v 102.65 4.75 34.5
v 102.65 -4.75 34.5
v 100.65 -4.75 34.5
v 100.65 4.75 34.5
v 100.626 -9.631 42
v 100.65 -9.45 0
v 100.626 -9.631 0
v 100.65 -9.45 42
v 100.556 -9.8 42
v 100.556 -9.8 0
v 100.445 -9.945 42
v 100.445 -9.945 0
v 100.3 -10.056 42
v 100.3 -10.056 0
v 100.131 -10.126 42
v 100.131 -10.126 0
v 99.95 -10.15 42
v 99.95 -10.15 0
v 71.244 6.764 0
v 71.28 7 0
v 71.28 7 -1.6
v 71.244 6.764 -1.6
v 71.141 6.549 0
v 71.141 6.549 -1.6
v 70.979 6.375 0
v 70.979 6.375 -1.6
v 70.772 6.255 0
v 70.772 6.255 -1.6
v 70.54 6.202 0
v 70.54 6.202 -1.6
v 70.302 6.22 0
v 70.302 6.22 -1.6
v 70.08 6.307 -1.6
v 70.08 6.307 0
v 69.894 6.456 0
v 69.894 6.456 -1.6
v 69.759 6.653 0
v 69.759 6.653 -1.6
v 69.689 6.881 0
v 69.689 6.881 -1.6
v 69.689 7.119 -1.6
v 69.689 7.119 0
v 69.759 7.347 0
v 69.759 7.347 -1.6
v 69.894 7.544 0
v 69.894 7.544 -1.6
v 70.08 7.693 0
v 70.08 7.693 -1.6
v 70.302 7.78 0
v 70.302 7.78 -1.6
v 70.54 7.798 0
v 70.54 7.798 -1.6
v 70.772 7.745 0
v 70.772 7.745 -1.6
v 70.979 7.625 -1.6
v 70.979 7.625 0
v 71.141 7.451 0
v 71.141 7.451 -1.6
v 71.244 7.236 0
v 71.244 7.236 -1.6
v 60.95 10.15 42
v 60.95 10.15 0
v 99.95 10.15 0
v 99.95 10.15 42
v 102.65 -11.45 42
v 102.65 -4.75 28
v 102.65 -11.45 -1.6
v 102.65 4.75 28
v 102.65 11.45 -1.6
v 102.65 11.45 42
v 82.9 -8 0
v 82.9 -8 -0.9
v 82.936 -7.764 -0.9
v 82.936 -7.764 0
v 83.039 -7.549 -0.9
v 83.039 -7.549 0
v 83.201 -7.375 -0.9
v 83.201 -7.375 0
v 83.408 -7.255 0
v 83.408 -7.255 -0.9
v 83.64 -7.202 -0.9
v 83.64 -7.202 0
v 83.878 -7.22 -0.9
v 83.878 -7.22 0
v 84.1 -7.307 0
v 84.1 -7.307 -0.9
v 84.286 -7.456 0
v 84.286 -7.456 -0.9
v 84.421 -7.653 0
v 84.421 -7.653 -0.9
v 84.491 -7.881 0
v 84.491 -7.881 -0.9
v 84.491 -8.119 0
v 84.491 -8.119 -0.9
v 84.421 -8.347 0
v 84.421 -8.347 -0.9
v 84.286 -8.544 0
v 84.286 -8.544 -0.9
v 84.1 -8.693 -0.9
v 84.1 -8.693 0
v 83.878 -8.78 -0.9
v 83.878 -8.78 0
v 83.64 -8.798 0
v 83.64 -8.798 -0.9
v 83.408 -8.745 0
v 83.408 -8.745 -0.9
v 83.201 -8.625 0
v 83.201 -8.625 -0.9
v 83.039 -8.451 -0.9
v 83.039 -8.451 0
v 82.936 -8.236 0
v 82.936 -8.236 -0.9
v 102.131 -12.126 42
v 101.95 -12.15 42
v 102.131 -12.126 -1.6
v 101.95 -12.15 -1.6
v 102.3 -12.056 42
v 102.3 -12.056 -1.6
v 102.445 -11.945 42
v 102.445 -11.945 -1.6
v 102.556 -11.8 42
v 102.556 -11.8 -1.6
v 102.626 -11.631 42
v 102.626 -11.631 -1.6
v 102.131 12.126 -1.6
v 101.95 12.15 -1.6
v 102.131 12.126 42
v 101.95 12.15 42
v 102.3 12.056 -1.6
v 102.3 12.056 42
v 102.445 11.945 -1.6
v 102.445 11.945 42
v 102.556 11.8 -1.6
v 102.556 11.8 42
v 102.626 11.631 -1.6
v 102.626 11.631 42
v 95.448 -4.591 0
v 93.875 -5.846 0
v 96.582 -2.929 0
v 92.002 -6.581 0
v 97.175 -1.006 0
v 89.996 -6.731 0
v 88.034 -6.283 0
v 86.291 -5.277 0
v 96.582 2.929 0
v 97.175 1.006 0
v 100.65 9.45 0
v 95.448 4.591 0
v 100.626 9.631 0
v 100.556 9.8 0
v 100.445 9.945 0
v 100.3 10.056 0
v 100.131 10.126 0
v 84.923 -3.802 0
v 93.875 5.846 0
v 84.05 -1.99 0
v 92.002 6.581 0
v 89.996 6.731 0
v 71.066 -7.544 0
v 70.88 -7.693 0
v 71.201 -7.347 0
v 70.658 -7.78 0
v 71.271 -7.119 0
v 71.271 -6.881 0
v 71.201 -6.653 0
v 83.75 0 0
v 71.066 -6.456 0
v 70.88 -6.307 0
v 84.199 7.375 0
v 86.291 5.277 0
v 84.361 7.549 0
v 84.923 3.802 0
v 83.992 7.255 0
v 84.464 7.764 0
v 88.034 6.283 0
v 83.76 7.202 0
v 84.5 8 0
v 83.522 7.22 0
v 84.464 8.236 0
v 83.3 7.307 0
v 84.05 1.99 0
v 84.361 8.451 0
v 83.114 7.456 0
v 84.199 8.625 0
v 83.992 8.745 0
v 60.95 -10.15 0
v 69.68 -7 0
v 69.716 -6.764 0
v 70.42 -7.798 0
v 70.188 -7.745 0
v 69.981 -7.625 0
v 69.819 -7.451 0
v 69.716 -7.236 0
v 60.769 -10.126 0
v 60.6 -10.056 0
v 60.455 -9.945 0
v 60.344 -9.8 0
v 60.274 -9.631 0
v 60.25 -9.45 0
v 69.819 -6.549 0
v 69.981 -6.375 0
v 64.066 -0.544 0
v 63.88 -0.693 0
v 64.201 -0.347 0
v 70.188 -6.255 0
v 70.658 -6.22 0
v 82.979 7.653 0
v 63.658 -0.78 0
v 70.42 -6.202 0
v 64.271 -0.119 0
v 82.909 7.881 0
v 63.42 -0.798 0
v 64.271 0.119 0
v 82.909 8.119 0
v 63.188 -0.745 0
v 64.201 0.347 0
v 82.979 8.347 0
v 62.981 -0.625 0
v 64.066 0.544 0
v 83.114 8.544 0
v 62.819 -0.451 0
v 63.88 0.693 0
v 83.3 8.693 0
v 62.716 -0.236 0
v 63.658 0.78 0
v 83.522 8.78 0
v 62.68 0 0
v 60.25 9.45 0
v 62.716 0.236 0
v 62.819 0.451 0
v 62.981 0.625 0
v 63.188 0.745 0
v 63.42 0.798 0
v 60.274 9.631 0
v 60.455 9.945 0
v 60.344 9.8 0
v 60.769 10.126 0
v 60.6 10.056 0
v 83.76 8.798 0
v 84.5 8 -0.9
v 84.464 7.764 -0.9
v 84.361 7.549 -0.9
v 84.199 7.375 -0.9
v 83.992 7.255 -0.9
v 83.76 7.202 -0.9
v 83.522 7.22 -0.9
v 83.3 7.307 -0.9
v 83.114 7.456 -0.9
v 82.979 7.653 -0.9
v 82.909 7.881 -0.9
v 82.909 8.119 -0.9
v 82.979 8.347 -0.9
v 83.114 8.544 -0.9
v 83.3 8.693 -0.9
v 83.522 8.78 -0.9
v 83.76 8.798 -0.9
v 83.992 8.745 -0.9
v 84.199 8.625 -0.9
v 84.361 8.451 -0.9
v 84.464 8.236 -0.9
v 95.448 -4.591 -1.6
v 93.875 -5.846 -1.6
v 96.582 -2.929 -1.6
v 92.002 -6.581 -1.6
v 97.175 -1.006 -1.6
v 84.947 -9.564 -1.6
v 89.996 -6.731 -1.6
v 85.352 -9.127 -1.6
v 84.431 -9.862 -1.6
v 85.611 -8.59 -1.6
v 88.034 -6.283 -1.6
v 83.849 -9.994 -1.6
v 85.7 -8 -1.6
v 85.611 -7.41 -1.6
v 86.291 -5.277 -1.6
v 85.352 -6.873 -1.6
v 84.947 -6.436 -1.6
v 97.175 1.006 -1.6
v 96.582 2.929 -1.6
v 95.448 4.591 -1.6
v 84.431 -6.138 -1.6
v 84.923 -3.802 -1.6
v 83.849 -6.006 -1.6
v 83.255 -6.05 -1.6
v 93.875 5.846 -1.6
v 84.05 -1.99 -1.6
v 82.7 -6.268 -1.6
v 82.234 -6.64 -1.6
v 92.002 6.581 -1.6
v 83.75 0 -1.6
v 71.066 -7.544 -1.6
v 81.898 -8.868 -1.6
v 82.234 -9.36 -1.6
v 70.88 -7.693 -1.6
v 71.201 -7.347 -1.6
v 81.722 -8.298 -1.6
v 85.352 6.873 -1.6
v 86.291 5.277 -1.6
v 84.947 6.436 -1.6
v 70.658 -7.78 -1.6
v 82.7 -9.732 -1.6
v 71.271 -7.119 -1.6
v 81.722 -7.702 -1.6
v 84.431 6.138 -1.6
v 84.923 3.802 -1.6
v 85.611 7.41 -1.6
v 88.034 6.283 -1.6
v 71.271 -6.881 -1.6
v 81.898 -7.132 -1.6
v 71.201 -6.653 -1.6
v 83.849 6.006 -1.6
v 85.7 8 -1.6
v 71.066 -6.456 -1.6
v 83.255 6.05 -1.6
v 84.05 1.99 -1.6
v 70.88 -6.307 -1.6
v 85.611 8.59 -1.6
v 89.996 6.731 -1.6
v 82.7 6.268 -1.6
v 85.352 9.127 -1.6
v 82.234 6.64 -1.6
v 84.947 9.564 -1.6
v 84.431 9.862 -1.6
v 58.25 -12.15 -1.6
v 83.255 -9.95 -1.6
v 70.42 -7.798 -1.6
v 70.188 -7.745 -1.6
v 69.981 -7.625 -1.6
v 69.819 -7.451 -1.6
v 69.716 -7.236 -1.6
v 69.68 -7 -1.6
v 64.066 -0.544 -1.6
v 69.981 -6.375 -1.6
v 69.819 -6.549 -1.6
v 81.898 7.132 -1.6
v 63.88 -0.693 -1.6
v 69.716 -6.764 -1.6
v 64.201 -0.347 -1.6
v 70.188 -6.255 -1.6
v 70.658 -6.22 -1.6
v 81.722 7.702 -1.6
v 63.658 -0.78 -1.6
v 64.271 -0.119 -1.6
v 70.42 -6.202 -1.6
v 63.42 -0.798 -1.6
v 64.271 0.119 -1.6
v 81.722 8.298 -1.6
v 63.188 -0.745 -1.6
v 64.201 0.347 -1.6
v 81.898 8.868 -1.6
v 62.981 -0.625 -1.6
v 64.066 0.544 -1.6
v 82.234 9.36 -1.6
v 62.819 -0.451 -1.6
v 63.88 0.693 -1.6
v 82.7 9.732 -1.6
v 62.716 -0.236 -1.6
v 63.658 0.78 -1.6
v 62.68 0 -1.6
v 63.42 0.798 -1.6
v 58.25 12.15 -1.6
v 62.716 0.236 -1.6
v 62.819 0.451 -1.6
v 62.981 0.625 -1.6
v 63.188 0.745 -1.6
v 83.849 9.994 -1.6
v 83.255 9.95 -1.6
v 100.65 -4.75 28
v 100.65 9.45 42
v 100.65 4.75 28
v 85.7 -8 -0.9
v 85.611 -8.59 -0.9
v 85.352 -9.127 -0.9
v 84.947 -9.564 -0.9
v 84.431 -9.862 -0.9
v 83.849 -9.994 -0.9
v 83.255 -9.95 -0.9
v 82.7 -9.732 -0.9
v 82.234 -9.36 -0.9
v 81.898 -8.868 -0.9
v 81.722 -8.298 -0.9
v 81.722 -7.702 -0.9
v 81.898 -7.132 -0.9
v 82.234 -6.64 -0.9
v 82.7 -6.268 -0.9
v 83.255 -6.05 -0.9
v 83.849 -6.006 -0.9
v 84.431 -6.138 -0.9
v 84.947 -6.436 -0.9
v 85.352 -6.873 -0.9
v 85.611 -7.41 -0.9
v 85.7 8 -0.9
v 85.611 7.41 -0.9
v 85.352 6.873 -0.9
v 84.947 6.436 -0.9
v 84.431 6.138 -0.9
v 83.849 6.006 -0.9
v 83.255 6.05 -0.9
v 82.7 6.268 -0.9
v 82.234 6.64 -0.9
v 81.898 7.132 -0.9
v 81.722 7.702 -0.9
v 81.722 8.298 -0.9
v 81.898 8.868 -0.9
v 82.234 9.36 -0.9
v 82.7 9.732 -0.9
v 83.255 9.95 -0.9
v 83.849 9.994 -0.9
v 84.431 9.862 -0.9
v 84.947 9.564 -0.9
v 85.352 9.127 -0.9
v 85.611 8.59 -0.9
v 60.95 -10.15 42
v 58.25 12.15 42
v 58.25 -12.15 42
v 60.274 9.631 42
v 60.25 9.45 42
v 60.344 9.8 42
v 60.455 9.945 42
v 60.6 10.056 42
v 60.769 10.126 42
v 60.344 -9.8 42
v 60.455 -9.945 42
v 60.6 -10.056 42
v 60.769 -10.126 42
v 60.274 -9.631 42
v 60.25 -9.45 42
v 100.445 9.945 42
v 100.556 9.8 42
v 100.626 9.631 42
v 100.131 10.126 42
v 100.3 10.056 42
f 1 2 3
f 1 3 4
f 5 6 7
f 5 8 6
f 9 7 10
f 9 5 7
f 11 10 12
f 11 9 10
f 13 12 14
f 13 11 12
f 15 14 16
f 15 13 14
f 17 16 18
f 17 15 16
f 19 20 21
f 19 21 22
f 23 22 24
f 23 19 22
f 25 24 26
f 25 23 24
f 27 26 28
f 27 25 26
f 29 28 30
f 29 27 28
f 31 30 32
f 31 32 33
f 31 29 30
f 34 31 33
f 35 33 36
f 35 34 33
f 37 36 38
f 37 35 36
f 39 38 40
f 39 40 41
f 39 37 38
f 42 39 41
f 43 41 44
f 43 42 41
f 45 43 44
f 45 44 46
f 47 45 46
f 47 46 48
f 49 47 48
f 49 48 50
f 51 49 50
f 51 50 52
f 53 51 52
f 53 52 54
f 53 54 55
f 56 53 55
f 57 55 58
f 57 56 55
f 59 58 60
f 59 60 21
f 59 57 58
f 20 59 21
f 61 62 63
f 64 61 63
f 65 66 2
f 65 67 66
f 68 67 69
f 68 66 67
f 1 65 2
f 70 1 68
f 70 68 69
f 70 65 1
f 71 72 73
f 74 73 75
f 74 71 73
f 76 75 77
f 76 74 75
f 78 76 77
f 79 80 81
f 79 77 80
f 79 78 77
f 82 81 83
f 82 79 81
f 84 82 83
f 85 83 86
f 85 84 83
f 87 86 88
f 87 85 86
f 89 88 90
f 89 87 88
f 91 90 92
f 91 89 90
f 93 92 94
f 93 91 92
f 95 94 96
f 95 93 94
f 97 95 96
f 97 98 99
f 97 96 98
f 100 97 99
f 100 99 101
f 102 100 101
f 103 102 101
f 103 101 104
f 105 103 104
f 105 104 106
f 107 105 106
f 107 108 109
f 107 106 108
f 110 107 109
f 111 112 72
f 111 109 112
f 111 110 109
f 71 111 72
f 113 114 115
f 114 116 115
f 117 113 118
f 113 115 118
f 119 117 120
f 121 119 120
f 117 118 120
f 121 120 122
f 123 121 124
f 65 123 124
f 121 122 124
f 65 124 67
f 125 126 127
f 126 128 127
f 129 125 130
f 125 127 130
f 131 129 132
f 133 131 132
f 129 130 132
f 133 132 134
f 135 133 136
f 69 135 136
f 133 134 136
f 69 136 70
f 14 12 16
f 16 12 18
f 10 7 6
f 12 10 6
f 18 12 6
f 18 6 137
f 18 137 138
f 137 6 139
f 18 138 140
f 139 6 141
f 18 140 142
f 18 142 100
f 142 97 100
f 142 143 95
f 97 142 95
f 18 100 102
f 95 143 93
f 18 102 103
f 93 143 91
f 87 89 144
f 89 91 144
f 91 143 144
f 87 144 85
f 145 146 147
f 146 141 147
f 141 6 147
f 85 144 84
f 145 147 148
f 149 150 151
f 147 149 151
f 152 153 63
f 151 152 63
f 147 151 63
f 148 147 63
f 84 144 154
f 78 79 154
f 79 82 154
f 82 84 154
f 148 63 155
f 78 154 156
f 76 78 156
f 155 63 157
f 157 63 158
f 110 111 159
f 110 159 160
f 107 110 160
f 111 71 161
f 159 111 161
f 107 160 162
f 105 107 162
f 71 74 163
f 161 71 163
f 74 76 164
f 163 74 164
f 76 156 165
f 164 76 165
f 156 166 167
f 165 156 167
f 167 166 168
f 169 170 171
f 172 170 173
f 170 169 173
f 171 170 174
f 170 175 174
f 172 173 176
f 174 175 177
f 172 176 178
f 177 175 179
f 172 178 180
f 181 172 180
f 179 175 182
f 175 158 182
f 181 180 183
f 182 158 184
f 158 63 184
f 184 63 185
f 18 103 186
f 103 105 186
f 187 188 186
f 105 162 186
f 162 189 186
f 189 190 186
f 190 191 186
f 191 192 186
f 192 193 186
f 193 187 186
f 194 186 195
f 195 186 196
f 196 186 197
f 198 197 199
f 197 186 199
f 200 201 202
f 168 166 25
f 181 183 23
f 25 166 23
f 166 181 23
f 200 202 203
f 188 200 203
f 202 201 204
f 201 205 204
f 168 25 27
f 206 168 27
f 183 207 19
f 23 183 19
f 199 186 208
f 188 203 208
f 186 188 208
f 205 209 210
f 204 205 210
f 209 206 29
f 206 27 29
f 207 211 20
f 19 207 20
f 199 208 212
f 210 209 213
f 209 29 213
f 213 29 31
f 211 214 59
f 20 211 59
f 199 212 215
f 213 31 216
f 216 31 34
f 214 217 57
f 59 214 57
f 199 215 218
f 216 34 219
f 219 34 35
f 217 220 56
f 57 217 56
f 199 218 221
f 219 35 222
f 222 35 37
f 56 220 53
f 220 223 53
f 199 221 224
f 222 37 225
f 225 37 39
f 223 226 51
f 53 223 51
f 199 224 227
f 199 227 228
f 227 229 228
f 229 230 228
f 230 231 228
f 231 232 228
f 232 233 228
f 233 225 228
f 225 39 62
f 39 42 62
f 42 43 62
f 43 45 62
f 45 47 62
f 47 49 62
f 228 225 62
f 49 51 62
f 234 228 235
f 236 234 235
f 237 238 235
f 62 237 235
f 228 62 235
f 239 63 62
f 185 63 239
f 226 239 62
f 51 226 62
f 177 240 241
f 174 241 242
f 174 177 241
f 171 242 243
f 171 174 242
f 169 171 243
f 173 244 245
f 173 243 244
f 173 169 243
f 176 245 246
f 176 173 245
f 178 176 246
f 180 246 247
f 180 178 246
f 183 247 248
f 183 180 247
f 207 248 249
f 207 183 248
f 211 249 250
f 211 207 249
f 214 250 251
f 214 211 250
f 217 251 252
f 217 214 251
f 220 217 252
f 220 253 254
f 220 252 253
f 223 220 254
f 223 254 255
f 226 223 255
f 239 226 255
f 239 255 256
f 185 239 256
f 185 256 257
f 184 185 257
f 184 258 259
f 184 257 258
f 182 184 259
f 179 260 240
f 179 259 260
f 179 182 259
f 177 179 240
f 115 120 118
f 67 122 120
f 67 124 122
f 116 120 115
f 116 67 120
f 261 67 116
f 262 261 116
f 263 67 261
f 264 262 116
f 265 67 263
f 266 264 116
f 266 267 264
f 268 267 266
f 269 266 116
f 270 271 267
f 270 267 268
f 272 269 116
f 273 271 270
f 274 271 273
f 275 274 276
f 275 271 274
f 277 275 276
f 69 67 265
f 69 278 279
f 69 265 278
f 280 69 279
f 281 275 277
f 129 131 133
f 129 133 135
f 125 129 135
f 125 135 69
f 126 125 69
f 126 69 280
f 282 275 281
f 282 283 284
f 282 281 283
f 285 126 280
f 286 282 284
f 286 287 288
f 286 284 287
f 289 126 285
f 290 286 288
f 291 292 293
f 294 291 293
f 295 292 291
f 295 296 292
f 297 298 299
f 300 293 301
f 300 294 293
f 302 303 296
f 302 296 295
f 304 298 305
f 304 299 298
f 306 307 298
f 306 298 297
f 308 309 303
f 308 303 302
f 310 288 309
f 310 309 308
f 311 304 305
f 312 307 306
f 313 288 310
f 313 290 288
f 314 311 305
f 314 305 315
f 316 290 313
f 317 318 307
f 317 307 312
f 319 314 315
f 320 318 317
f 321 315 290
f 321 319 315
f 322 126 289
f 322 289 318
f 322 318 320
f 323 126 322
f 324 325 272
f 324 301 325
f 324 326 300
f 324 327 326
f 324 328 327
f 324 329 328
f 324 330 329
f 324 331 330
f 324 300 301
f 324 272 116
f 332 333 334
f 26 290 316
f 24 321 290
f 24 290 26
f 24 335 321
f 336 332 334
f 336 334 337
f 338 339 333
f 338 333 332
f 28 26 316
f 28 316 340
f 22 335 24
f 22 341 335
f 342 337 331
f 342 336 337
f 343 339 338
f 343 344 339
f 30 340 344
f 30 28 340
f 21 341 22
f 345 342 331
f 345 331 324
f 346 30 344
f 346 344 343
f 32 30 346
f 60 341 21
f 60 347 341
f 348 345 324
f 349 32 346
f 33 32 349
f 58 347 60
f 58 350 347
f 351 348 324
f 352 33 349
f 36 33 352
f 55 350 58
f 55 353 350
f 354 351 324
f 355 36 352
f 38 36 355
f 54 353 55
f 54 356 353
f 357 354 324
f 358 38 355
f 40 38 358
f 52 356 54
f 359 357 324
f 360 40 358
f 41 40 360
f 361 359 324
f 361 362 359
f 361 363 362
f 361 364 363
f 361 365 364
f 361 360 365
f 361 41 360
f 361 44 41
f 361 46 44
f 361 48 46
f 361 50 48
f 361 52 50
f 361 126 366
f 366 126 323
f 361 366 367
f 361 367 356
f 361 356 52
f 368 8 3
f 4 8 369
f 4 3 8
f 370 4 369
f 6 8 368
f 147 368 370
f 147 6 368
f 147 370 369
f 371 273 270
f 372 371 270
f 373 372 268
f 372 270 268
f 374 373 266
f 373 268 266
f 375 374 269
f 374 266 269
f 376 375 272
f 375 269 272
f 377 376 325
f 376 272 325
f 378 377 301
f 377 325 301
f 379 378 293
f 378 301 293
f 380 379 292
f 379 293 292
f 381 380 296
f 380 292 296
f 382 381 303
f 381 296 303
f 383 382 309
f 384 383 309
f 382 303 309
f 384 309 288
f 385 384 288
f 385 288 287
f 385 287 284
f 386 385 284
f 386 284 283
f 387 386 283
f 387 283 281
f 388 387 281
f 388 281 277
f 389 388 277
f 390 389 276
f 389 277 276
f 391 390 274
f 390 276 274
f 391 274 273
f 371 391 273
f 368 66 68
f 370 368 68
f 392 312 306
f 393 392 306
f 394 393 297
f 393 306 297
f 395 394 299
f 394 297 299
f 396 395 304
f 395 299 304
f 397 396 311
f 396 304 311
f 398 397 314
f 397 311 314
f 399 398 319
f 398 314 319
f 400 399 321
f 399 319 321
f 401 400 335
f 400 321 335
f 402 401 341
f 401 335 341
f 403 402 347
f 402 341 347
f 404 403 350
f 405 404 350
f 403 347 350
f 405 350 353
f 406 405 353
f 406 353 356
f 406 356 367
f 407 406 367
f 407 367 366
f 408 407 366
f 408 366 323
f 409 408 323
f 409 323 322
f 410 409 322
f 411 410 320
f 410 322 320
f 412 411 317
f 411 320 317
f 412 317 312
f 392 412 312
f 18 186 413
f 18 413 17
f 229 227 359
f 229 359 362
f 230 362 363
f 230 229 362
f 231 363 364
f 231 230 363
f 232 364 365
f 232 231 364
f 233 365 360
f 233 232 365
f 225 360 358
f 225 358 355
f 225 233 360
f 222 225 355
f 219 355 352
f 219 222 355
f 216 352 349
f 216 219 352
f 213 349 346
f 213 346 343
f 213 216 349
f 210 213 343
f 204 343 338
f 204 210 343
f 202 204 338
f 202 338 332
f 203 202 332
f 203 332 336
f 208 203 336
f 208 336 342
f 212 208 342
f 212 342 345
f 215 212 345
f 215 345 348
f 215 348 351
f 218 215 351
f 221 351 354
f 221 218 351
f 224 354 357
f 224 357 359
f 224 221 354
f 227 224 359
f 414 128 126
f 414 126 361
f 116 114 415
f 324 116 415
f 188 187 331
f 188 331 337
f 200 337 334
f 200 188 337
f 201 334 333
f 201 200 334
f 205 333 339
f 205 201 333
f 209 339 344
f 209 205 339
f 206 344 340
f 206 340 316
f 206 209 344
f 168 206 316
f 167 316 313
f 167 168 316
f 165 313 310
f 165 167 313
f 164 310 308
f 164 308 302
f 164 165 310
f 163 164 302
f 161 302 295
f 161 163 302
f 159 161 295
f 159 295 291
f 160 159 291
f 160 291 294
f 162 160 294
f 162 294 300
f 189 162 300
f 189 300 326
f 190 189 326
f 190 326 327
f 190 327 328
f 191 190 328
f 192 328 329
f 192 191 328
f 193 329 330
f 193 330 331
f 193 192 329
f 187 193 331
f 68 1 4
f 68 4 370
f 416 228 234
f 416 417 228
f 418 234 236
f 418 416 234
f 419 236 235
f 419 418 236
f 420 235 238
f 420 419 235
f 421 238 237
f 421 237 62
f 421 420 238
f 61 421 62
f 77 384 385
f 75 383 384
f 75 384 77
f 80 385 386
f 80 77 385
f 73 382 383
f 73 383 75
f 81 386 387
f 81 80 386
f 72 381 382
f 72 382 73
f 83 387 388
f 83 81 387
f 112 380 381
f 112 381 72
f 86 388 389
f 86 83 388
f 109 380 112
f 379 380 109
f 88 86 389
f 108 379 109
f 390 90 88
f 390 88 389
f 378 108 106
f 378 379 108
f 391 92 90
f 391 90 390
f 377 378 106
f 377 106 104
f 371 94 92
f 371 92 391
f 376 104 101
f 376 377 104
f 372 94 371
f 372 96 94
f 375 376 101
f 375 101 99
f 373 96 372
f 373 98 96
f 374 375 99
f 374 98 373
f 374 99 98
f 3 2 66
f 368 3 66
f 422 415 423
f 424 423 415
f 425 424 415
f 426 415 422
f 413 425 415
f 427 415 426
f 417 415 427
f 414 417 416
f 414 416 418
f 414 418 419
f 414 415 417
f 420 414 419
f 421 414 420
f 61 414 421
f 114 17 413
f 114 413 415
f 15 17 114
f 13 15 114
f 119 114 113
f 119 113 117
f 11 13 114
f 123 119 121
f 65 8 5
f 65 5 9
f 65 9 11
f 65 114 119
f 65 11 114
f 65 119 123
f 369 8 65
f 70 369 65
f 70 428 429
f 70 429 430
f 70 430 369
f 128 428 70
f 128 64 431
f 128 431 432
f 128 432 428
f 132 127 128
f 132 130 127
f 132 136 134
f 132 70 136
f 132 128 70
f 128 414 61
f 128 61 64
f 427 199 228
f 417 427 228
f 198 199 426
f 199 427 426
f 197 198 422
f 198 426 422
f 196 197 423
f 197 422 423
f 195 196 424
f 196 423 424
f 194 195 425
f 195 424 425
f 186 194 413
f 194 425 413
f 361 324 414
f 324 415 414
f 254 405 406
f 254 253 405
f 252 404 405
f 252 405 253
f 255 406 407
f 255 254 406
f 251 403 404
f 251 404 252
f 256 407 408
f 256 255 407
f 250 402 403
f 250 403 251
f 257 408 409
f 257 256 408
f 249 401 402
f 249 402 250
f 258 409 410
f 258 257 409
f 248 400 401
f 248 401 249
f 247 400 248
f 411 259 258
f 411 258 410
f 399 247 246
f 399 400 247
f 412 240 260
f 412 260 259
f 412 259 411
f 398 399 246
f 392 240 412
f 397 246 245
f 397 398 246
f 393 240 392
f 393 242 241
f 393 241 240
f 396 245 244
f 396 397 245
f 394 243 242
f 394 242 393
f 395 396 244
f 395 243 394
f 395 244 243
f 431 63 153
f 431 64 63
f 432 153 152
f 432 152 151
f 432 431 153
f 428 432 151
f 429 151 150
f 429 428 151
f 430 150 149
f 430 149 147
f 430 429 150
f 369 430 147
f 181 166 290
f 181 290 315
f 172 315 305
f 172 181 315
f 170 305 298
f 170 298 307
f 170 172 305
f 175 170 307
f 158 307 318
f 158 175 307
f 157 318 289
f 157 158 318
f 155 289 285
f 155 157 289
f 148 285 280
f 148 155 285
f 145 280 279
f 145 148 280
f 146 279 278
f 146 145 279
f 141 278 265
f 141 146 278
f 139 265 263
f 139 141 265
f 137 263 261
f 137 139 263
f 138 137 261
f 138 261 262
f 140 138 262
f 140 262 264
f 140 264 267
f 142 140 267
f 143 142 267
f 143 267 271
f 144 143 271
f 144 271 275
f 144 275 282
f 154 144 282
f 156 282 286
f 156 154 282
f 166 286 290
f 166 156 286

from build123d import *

# Parameters (mm, degrees)
SKETCH_1_W          = 44.4
SKETCH_1_H          = 24.3
SKETCH_1_W_2        = 40.4
SKETCH_1_H_2        = 20.3
EXTRUDE_5_DEPTH     = 42
EXTRUDE_5_2_DEPTH   = 42
EXTRUDE_6_DEPTH     = 42
EXTRUDE_6_2_DEPTH   = 42
EXTRUDE_6_3_DEPTH   = 42
EXTRUDE_6_4_DEPTH   = 42
SKETCH_6_R          = 6.75
SKETCH_6_R_2        = 0.8
SKETCH_6_W          = 44.4
SKETCH_6_H          = 24.3
EXTRUDE_8_DEPTH     = 1.6
FILLET_1_R          = 0.7
FILLET_2_R          = 0.7
FILLET_3_R          = 0.7
FILLET_4_R          = 0.7
FILLET_5_R          = 0.7
FILLET_6_R          = 0.7
SKETCH_7_R          = 2
CUT_EXTRUDE_2_DEPTH = 0.7
SKETCH_8_W          = 6.5
SKETCH_8_H          = 9.5
CUT_EXTRUDE_3_DEPTH = 9.8
SKETCH_9_W          = 6.5
SKETCH_9_H          = 9.5
CUT_EXTRUDE_4_DEPTH = 9.8
SKETCH_10_W         = 6.5
SKETCH_10_H         = 9.5
CUT_EXTRUDE_5_DEPTH = 9.8
SKETCH_11_W         = 6.5
SKETCH_11_H         = 9.5
CUT_EXTRUDE_6_DEPTH = 9.8
SKETCH_12_W         = 6.5
SKETCH_12_H         = 9.5
CUT_EXTRUDE_7_DEPTH = 9.8
SKETCH_13_W         = 6.5
SKETCH_13_H         = 9.5
CUT_EXTRUDE_8_DEPTH = 9.8
FILLET_7_R          = 0.7
FILLET_8_R          = 0.7
FILLET_9_R          = 0.7
FILLET_10_R         = 0.7
FILLET_11_R         = 0.7
FILLET_12_R         = 0.7
EXTRUDE_9_DEPTH     = 3
EXTRUDE_11_DEPTH    = 3
EXTRUDE_12_DEPTH    = 3
EXTRUDE_START       = -3
EXTRUDE_13_DEPTH    = 3
CUT_EXTRUDE_9_DEPTH = 10


with BuildPart() as part:
    # 草图1 → 凸台-拉伸5 (new body)
    with BuildSketch(Plane.XY):
        with Locations((80.45, 0)):
            Rectangle(SKETCH_1_W, SKETCH_1_H)
        with Locations((80.45, 0)):
            Rectangle(SKETCH_1_W_2, SKETCH_1_H_2, mode=Mode.SUBTRACT)
    extrude(amount=EXTRUDE_5_DEPTH)



with BuildPart() as body_2:
    # 草图1 → Extrude 5 2 (new body)
    with BuildSketch(Plane.XY):
        with Locations((-80.45, 0)):
            Rectangle(SKETCH_1_W, SKETCH_1_H)
        with Locations((-80.45, 0)):
            Rectangle(SKETCH_1_W_2, SKETCH_1_H_2, mode=Mode.SUBTRACT)
    extrude(amount=EXTRUDE_5_2_DEPTH)


with BuildPart() as body_3:
    # 草图5 → 凸台-拉伸6 (new body)
    with BuildSketch(Plane.XY):
        Polygon((28.782128445, 85.964823228), (60.17766953, 117.360364312), (77.360364312, 100.17766953), (45.964823228, 68.782128445), align=None)
        Polygon((60.17766953, 114.531937188), (74.531937188, 100.17766953), (45.964823228, 71.61055557), (31.61055557, 85.964823228), align=None, mode=Mode.SUBTRACT)
    extrude(amount=EXTRUDE_6_DEPTH)


with BuildPart() as body_4:
    # 草图5 → Extrude 6 2 (new body)
    with BuildSketch(Plane.XY):
        Polygon((45.964823228, -68.782128445), (28.782128445, -85.964823228), (60.17766953, -117.360364312), (77.360364312, -100.17766953), align=None)
        Polygon((31.61055557, -85.964823228), (60.17766953, -114.531937188), (74.531937188, -100.17766953), (45.964823228, -71.61055557), align=None, mode=Mode.SUBTRACT)
    extrude(amount=EXTRUDE_6_2_DEPTH)


with BuildPart() as body_5:
    # 草图5 → Extrude 6 3 (new body)
    with BuildSketch(Plane.XY):
        Polygon((-28.782128445, -85.964823228), (-60.17766953, -117.360364312), (-77.360364312, -100.17766953), (-45.964823228, -68.782128445), align=None)
        Polygon((-60.17766953, -114.531937188), (-74.531937188, -100.17766953), (-45.964823228, -71.61055557), (-31.61055557, -85.964823228), align=None, mode=Mode.SUBTRACT)
    extrude(amount=EXTRUDE_6_3_DEPTH)


with BuildPart() as body_6:
    # 草图5 → Extrude 6 4 (new body)
    with BuildSketch(Plane.XY):
        Polygon((-45.964823228, 68.782128445), (-28.782128445, 85.964823228), (-60.17766953, 117.360364312), (-77.360364312, 100.17766953), align=None)
        Polygon((-31.61055557, 85.964823228), (-60.17766953, 114.531937188), (-74.531937188, 100.17766953), (-45.964823228, 71.61055557), align=None, mode=Mode.SUBTRACT)
    extrude(amount=EXTRUDE_6_4_DEPTH)


with BuildPart() as part_1:
    add(part.part)

    add(body_2.part)  # 凸台-拉伸8 merges body 2

    add(body_3.part)  # 凸台-拉伸8 merges body 3

    add(body_4.part)  # 凸台-拉伸8 merges body 4

    add(body_5.part)  # 凸台-拉伸8 merges body 5

    add(body_6.part)  # 凸台-拉伸8 merges body 6
    # 草图6 → 凸台-拉伸8 (add)
    # profile 1 of 6: a face of its own
    with BuildSketch(Plane(origin=(0, 0, 0), x_dir=(-1, 0, 0), z_dir=(0, 0, -1))):
        Polygon((-77.360364312, 100.17766953), (-60.17766953, 117.360364312), (-28.782128445, 85.964823228), (-45.964823228, 68.782128445), align=None)
        with Locations((-60.17766953, 100.17766953)):
            Circle(SKETCH_6_R, mode=Mode.SUBTRACT)
        with Locations((-61.026197667, 89.712489168)):
            Circle(SKETCH_6_R_2, mode=Mode.SUBTRACT)
        with Locations((-50.971139239, 81.071644302)):
            Circle(SKETCH_6_R_2, mode=Mode.SUBTRACT)
        with Locations((-41.071644302, 81.071644302)):
            Circle(SKETCH_6_R_2, mode=Mode.SUBTRACT)
        with Locations(Location((-41.071644302, 90.971139239, 0), (0, 0, 180))):
            Circle(SKETCH_6_R_2, mode=Mode.SUBTRACT)
        with Locations(Location((-49.712489168, 101.026197667, 0), (0, 0, 180))):
            Circle(SKETCH_6_R_2, mode=Mode.SUBTRACT)
    # profile 2 of 6: a face of its own
    with BuildSketch(Plane(origin=(0, 0, 0), x_dir=(-1, 0, 0), z_dir=(0, 0, -1))):
        with Locations((-80.45, 0)):
            Rectangle(SKETCH_6_W, SKETCH_6_H)
        with Locations((-70.48, -7)):
            Circle(SKETCH_6_R_2, mode=Mode.SUBTRACT)
        with Locations((-63.48, 0)):
            Circle(SKETCH_6_R_2, mode=Mode.SUBTRACT)
        with Locations((-90.5, 0)):
            Circle(SKETCH_6_R, mode=Mode.SUBTRACT)
        with Locations((-83.7, -8)):
            Circle(SKETCH_6_R_2, mode=Mode.SUBTRACT)
        with Locations(Location((-70.48, 7, 0), (0, 0, 180))):
            Circle(SKETCH_6_R_2, mode=Mode.SUBTRACT)
        with Locations(Location((-83.7, 8, 0), (0, 0, 180))):
            Circle(SKETCH_6_R_2, mode=Mode.SUBTRACT)
    # profile 3 of 6: a face of its own
    with BuildSketch(Plane(origin=(0, 0, 0), x_dir=(-1, 0, 0), z_dir=(0, 0, -1))):
        Polygon((-45.964823228, -68.782128445), (-77.360364312, -100.17766953), (-60.17766953, -117.360364312), (-28.782128445, -85.964823228), align=None)
        with Locations((-49.712489168, -101.026197667)):
            Circle(SKETCH_6_R_2, mode=Mode.SUBTRACT)
        with Locations((-41.071644302, -90.971139239)):
            Circle(SKETCH_6_R_2, mode=Mode.SUBTRACT)
        with Locations(Location((-41.071644302, -81.071644302, 0), (0, 0, 180))):
            Circle(SKETCH_6_R_2, mode=Mode.SUBTRACT)
        with Locations(Location((-50.971139239, -81.071644302, 0), (0, 0, 180))):
            Circle(SKETCH_6_R_2, mode=Mode.SUBTRACT)
        with Locations(Location((-61.026197667, -89.712489168, 0), (0, 0, 180))):
            Circle(SKETCH_6_R_2, mode=Mode.SUBTRACT)
        with Locations(Location((-60.17766953, -100.17766953, 0), (0, 0, 180))):
            Circle(SKETCH_6_R, mode=Mode.SUBTRACT)
    # profile 4 of 6: a face of its own
    with BuildSketch(Plane(origin=(0, 0, 0), x_dir=(-1, 0, 0), z_dir=(0, 0, -1))):
        Polygon((77.360364312, -100.17766953), (60.17766953, -117.360364312), (28.782128445, -85.964823228), (45.964823228, -68.782128445), align=None)
        with Locations((60.17766953, -100.17766953)):
            Circle(SKETCH_6_R, mode=Mode.SUBTRACT)
        with Locations((61.026197667, -89.712489168)):
            Circle(SKETCH_6_R_2, mode=Mode.SUBTRACT)
        with Locations((50.971139239, -81.071644302)):
            Circle(SKETCH_6_R_2, mode=Mode.SUBTRACT)
        with Locations((41.071644302, -81.071644302)):
            Circle(SKETCH_6_R_2, mode=Mode.SUBTRACT)
        with Locations(Location((41.071644302, -90.971139239, 0), (0, 0, 180))):
            Circle(SKETCH_6_R_2, mode=Mode.SUBTRACT)
        with Locations(Location((49.712489168, -101.026197667, 0), (0, 0, 180))):
            Circle(SKETCH_6_R_2, mode=Mode.SUBTRACT)
    # profile 5 of 6: a face of its own
    with BuildSketch(Plane(origin=(0, 0, 0), x_dir=(-1, 0, 0), z_dir=(0, 0, -1))):
        with Locations((80.45, 0)):
            Rectangle(SKETCH_6_W, SKETCH_6_H)
        with Locations((83.7, 8)):
            Circle(SKETCH_6_R_2, mode=Mode.SUBTRACT)
        with Locations((70.48, 7)):
            Circle(SKETCH_6_R_2, mode=Mode.SUBTRACT)
        with Locations(Location((83.7, -8, 0), (0, 0, 180))):
            Circle(SKETCH_6_R_2, mode=Mode.SUBTRACT)
        with Locations(Location((90.5, 0, 0), (0, 0, 180))):
            Circle(SKETCH_6_R, mode=Mode.SUBTRACT)
        with Locations(Location((63.48, 0, 0), (0, 0, 180))):
            Circle(SKETCH_6_R_2, mode=Mode.SUBTRACT)
        with Locations(Location((70.48, -7, 0), (0, 0, 180))):
            Circle(SKETCH_6_R_2, mode=Mode.SUBTRACT)
    # profile 6 of 6: a face of its own
    with BuildSketch(Plane(origin=(0, 0, 0), x_dir=(-1, 0, 0), z_dir=(0, 0, -1))):
        Polygon((45.964823228, 68.782128445), (77.360364312, 100.17766953), (60.17766953, 117.360364312), (28.782128445, 85.964823228), align=None)
        with Locations((49.712489168, 101.026197667)):
            Circle(SKETCH_6_R_2, mode=Mode.SUBTRACT)
        with Locations((41.071644302, 90.971139239)):
            Circle(SKETCH_6_R_2, mode=Mode.SUBTRACT)
        with Locations(Location((41.071644302, 81.071644302, 0), (0, 0, 180))):
            Circle(SKETCH_6_R_2, mode=Mode.SUBTRACT)
        with Locations(Location((50.971139239, 81.071644302, 0), (0, 0, 180))):
            Circle(SKETCH_6_R_2, mode=Mode.SUBTRACT)
        with Locations(Location((61.026197667, 89.712489168, 0), (0, 0, 180))):
            Circle(SKETCH_6_R_2, mode=Mode.SUBTRACT)
        with Locations(Location((60.17766953, 100.17766953, 0), (0, 0, 180))):
            Circle(SKETCH_6_R, mode=Mode.SUBTRACT)
    extrude(amount=EXTRUDE_8_DEPTH)

    # 圆角1
    fillet_1_edges = [part_1.edges().sort_by_distance(p)[0] for p in [
        (60.17766953, 114.531937188, 21),
        (31.61055557, 85.964823228, 21),
        (45.964823228, 71.61055557, 21),
        (74.531937188, 100.17766953, 21),
    ]]
    fillet(fillet_1_edges, radius=FILLET_1_R)

    # 圆角2
    fillet_2_edges = [part_1.edges().sort_by_distance(p)[0] for p in [
        (-60.17766953, 114.531937188, 21),
        (-74.531937188, 100.17766953, 21),
        (-45.964823228, 71.61055557, 21),
        (-31.61055557, 85.964823228, 21),
    ]]
    fillet(fillet_2_edges, radius=FILLET_2_R)

    # 圆角3
    fillet_3_edges = [part_1.edges().sort_by_distance(p)[0] for p in [
        (-100.65, 10.15, 21),
        (-100.65, -10.15, 21),
        (-60.25, -10.15, 21),
        (-60.25, 10.15, 21),
    ]]
    fillet(fillet_3_edges, radius=FILLET_3_R)

    # 圆角4
    fillet_4_edges = [part_1.edges().sort_by_distance(p)[0] for p in [
        (-60.17766953, -114.531937188, 21),
        (-31.61055557, -85.964823228, 21),
        (-45.964823228, -71.61055557, 21),
        (-74.531937188, -100.17766953, 21),
    ]]
    fillet(fillet_4_edges, radius=FILLET_4_R)

    # 圆角5
    fillet_5_edges = [part_1.edges().sort_by_distance(p)[0] for p in [
        (60.17766953, -114.531937188, 21),
        (74.531937188, -100.17766953, 21),
        (45.964823228, -71.61055557, 21),
        (31.61055557, -85.964823228, 21),
    ]]
    fillet(fillet_5_edges, radius=FILLET_5_R)

    # 圆角6
    fillet_6_edges = [part_1.edges().sort_by_distance(p)[0] for p in [
        (60.25, 10.15, 21),
        (60.25, -10.15, 21),
        (100.65, -10.15, 21),
        (100.65, 10.15, 21),
    ]]
    fillet(fillet_6_edges, radius=FILLET_6_R)

    # 草图7 → 切除-拉伸2 (cut)
    with BuildSketch(Plane(origin=(0, 0, -1.6), x_dir=(-1, 0, 0), z_dir=(0, 0, -1))):
        with Locations((83.7, 8)):
            Circle(SKETCH_7_R)
        with Locations((83.7, -8)):
            Circle(SKETCH_7_R)
        with Locations((61.026197667, -89.712489168)):
            Circle(SKETCH_7_R)
        with Locations((49.712489168, -101.026197667)):
            Circle(SKETCH_7_R)
        with Locations(Location((-49.712489168, -101.026197667, 0), (0, 0, 180))):
            Circle(SKETCH_7_R)
        with Locations(Location((-61.026197667, -89.712489168, 0), (0, 0, 180))):
            Circle(SKETCH_7_R)
        with Locations(Location((-83.7, -8, 0), (0, 0, 180))):
            Circle(SKETCH_7_R)
        with Locations(Location((-83.7, 8, 0), (0, 0, 180))):
            Circle(SKETCH_7_R)
        with Locations((-61.026197667, 89.712489168)):
            Circle(SKETCH_7_R)
        with Locations((-49.712489168, 101.026197667)):
            Circle(SKETCH_7_R)
        with Locations((49.712489168, 101.026197667)):
            Circle(SKETCH_7_R)
        with Locations((61.026197667, 89.712489168)):
            Circle(SKETCH_7_R)
    extrude(amount=-CUT_EXTRUDE_2_DEPTH, mode=Mode.SUBTRACT)

    # 草图8 → 切除-拉伸3 (cut)
    with BuildSketch(Plane(origin=(-88.769016921, -88.769016921, 0), x_dir=(0, 0, 1), z_dir=(-0.7071067811865477, -0.7071067811865475, 0))):
        with Locations((31.25, -28.284271247)):
            Rectangle(SKETCH_8_W, SKETCH_8_H)
    extrude(amount=-CUT_EXTRUDE_3_DEPTH, mode=Mode.SUBTRACT)

    # 草图9 → 切除-拉伸4 (cut)
    with BuildSketch(Plane.ZY.offset(102.65)):
        with Locations((31.25, 0)):
            Rectangle(SKETCH_9_W, SKETCH_9_H)
    extrude(amount=-CUT_EXTRUDE_4_DEPTH, mode=Mode.SUBTRACT)

    # 草图10 → 切除-拉伸5 (cut)
    with BuildSketch(Plane(origin=(-88.769016921, 88.769016921, 0), x_dir=(0, 0, 1), z_dir=(-0.7071067811865477, 0.7071067811865475, 0))):
        with Locations((31.25, 28.305878323)):
            Rectangle(SKETCH_10_W, SKETCH_10_H)
    extrude(amount=-CUT_EXTRUDE_5_DEPTH, mode=Mode.SUBTRACT)

    # 草图11 → 切除-拉伸6 (cut)
    with BuildSketch(Plane(origin=(88.769016921, 88.769016921, 0), x_dir=(0, 0, -1), z_dir=(0.7071067811865477, 0.7071067811865475, 0))):
        with Locations((-31.25, 28.284271247)):
            Rectangle(SKETCH_11_W, SKETCH_11_H)
    extrude(amount=-CUT_EXTRUDE_6_DEPTH, mode=Mode.SUBTRACT)

    # 草图12 → 切除-拉伸7 (cut)
    with BuildSketch(Plane(origin=(102.65, 0, 0), x_dir=(0, 0, -1), z_dir=(1, 0, 0))):
        with Locations((-31.25, 0)):
            Rectangle(SKETCH_12_W, SKETCH_12_H)
    extrude(amount=-CUT_EXTRUDE_7_DEPTH, mode=Mode.SUBTRACT)

    # 草图13 → 切除-拉伸8 (cut)
    with BuildSketch(Plane(origin=(88.769016921, -88.769016921, 0), x_dir=(0, 0, -1), z_dir=(0.7071067811865477, -0.7071067811865475, 0))):
        with Locations((-31.25, -28.284271247)):
            Rectangle(SKETCH_13_W, SKETCH_13_H)
    extrude(amount=-CUT_EXTRUDE_8_DEPTH, mode=Mode.SUBTRACT)

    # 圆角7
    fillet_7_edges = [part_1.edges().sort_by_distance(p)[0] for p in [
        (-77.360364312, 100.17766953, 20.2),
        (-60.17766953, 117.360364312, 20.2),
    ]]
    fillet(fillet_7_edges, radius=FILLET_7_R)

    # 圆角8
    fillet_8_edges = [part_1.edges().sort_by_distance(p)[0] for p in [
        (-102.65, -12.15, 20.2),
        (-102.65, 12.15, 20.2),
    ]]
    fillet(fillet_8_edges, radius=FILLET_8_R)

    # 圆角9
    fillet_9_edges = [part_1.edges().sort_by_distance(p)[0] for p in [
        (-60.17766953, -117.360364312, 20.2),
        (-77.360364312, -100.17766953, 20.2),
    ]]
    fillet(fillet_9_edges, radius=FILLET_9_R)

    # 圆角10
    fillet_10_edges = [part_1.edges().sort_by_distance(p)[0] for p in [
        (77.360364312, -100.17766953, 20.2),
        (60.17766953, -117.360364312, 20.2),
    ]]
    fillet(fillet_10_edges, radius=FILLET_10_R)

    # 圆角11
    fillet_11_edges = [part_1.edges().sort_by_distance(p)[0] for p in [
        (102.65, 12.15, 20.2),
        (102.65, -12.15, 20.2),
    ]]
    fillet(fillet_11_edges, radius=FILLET_11_R)

    # 圆角12
    fillet_12_edges = [part_1.edges().sort_by_distance(p)[0] for p in [
        (60.17766953, 117.360364312, 20.2),
        (77.360364312, 100.17766953, 20.2),
    ]]
    fillet(fillet_12_edges, radius=FILLET_12_R)

    # 草图14 → 凸台-拉伸9 (add)
    with BuildSketch(Plane.XY.offset(42)):
        Polygon((58.25, 12.15), (42.5, 24.862562051), (42.5, 65.317305217), (45.964823228, 68.782128445), (28.782128445, 85.964823228), (25.317305217, 82.5), (-25.317305217, 82.5), (-28.782128445, 85.964823228), (-45.964823228, 68.782128445), (-42.5, 65.317305217), (-42.5, 24.862562051), (-58.25, 12.15), (-58.25, -12.15), (-42.5, -24.862562051), (-42.5, -65.317305217), (-45.964823228, -68.782128445), (-28.782128445, -85.964823228), (-25.317305217, -82.5), (25.317305217, -82.5), (28.782128445, -85.964823228), (45.964823228, -68.782128445), (42.5, -65.317305217), (42.5, -24.862562051), (58.25, -12.15), align=None)
    extrude(amount=-EXTRUDE_9_DEPTH)

    # 草图19 → 凸台-拉伸11 (add)
    with BuildSketch(Plane(origin=(0, 0, 39), x_dir=(-1, 0, 0), z_dir=(0, 0, -1))):
        Polygon((-50.207463915, 73.024769132), (-50.207463915, 33.024769132), (-58.25, 26.533261892), (-58.25, 12.15), (-58.25, -12.15), (-58.25, -26.533261892), (-50.207463915, -33.024769132), (-50.207463915, -73.024769132), (-45.964823228, -68.782128445), (-28.782128445, -85.964823228), (28.782128445, -85.964823228), (45.964823228, -68.782128445), (50.207463915, -73.024769132), (50.207463915, -33.024769132), (58.25, -26.533261892), (58.25, -12.15), (58.25, 12.15), (58.25, 26.533261892), (50.207463915, 33.024769132), (50.207463915, 73.024769132), (45.964823228, 68.782128445), (28.782128445, 85.964823228), (-28.782128445, 85.964823228), (-45.964823228, 68.782128445), align=None)
    extrude(amount=-EXTRUDE_11_DEPTH)

    # 草图20 → 凸台-拉伸12 (add)
    with BuildSketch(Plane(origin=(0, 0, 39), x_dir=(-1, 0, 0), z_dir=(0, 0, -1))):
        Polygon((-28.782128445, 85.964823228), (-35.782128445, 92.964823228), (35.782128445, 92.964823228), (28.782128445, 85.964823228), align=None)
        Polygon((-28.782128445, -85.964823228), (-35.782128445, -92.964823228), (35.782128445, -92.964823228), (28.782128445, -85.964823228), align=None)
    extrude(amount=-EXTRUDE_12_DEPTH)

    # 草图21 → 凸台-拉伸13 (add)
    with BuildSketch(Plane.XY.offset(42).offset(EXTRUDE_START)):
        Polygon((-58.25, 26.533261892), (-63.25, 22.497527908), (-63.25, 12.15), (-58.25, 12.15), align=None)
        Polygon((-63.25, -22.497527908), (-63.25, -12.15), (-58.25, -12.15), (-58.25, -26.533261892), align=None)
        Polygon((58.25, -26.533261892), (63.25, -22.497527908), (63.25, -12.15), (58.25, -12.15), align=None)
        Polygon((58.25, 12.15), (58.25, 26.533261892), (63.25, 22.497527908), (63.25, 12.15), align=None)
    extrude(amount=EXTRUDE_13_DEPTH)

    # 草图23 → 切除-拉伸9 (cut)
    with BuildSketch(Plane(origin=(0, 0, 39), x_dir=(-1, 0, 0), z_dir=(0, 0, -1))):
        Polygon((-68.610786789, 12.15), (-58.25, 12.15), (-58.25, -12.15), (-68.610786789, -12.15), (-90.709783982, -134.477999487), (134.065150154, -134.477999487), (122.689900451, 131.247833581), (-101.95, 131.247833581), align=None)
    extrude(amount=-CUT_EXTRUDE_9_DEPTH, mode=Mode.SUBTRACT)


with BuildPart() as body_2_2:
    # of the pieces the cut leaves, the one that is kept (cut_extrude_9_keep)
    add(part_1.part.solids().sort_by_distance((58.25, 12.15, 42))[0])


solid = body_2_2.part
